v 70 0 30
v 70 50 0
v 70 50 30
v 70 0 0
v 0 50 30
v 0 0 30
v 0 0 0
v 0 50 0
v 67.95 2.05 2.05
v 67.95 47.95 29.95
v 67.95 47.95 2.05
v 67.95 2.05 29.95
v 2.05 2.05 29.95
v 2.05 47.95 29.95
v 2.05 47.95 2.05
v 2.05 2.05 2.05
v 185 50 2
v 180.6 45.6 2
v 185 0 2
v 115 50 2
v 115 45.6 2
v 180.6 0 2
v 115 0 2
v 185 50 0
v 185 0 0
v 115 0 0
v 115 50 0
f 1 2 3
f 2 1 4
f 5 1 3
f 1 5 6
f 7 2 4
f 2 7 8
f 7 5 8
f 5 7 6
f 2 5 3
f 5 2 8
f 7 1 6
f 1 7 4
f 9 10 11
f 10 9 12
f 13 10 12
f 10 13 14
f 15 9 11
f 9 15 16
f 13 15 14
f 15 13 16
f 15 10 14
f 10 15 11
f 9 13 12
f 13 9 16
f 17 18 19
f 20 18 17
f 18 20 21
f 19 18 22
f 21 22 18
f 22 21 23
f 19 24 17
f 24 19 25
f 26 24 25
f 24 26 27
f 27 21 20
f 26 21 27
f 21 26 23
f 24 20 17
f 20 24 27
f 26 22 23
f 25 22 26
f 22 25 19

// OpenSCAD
// Configuration and Dimensions
// All dimensions in millimetres (mm)

// Box Dimensions (Outer)
$box_outer_x = 70;
$box_outer_y = 50;
$box_outer_z = 30;

// Wall and Floor Thickness
$wall_thickness = 2;
$floor_thickness = 2;

// Lid Dimensions
$plate_thickness = 2;
$lip_thickness = 1.5;
$lip_height = 4;

// Lip Outer Size (to fit inside box opening)
$lip_outer_x = 65.6;
$lip_outer_y = 45.6;

// Clearance
$clearance = 0.2;

// Gap between parts for printing together
$gap = 10;

// Resolution for curved shapes
$fn = 64;

// --- Part 1: The Box ---
// Position: Centred on origin in X, Y. Z starts at 0.
// Outer box is 70x50x30.
// Inner cavity calculation:
// Inner X = 70 - 2*2 = 66
// Inner Y = 50 - 2*2 = 46
// Inner Z = 30 - 2 (floor) = 28 (open top)

translate([0, 0, 0])
difference() {
    // Outer Shell
    cube([
        $box_outer_x, 
        $box_outer_y, 
        $box_outer_z
    ]);
    
    // Cut out the interior
    // We extend the cut slightly past the faces to ensure clean separation
    translate([
        $wall_thickness + 0.05, 
        $wall_thickness + 0.05, 
        $floor_thickness + 0.05
    ])
    cube([
        $box_outer_x - 2*$wall_thickness - 0.1, 
        $box_outer_y - 2*$wall_thickness - 0.1, 
        $box_outer_z - $floor_thickness - 0.1
    ]);
}

// --- Part 2: The Lid ---
// Position: On the +X side of the box, with a 10mm gap.
// Box ends at X = 70. Lid starts at X = 70 + 10 = 80.
// Lid is printed upside down (plate on bed).
// Lid is centered on the bed in Y, but shifted in X.
// Lid Center X = 80 + (70/2) = 115.
// Lid Center Y = 0.

translate([115, 0, 0])
difference() {
    // 1. The Base Plate (70 x 50 x 2)
    cube([
        $box_outer_x, 
        $box_outer_y, 
        $plate_thickness
    ]);
    
    // 2. The Lip Structure
    // The lip sits ON TOP of the plate (Z = 2 to Z = 6).
    // It has an outer dimension of 65.6 x 45.6.
    // It has an inner hole to slide into the box.
    // Box inner opening is 66 x 46.
    // Lip outer is 65.6 x 45.6.
    // Lip inner needs to be (66 - 0.4) x (46 - 0.4) = 65.2 x 45.6 to allow 0.2mm clearance.
    
    translate([0, 0, $plate_thickness])
    difference() {
        // Solid Lip Block (Outer dimensions)
        cube([
            $lip_outer_x, 
            $lip_outer_y, 
            $lip_height + $lip_thickness
        ]);
        
        // Cut out the slot for the board
        // Extend cut slightly past faces
        translate([
            ($lip_outer_x - ($box_outer_x - 2*$wall_thickness - $clearance*2)) / 2 + 0.05,
            ($lip_outer_y - ($box_outer_y - 2*$wall_thickness - $clearance*2)) / 2 + 0.05,
            $lip_thickness + 0.05
        ])
        cube([
            $box_outer_x - 2*$wall_thickness - $clearance*2 - 0.1,
            $box_outer_y - 2*$wall_thickness - $clearance*2 - 0.1,
            $lip_height + $lip_thickness - 0.1
        ]);
    }
}
